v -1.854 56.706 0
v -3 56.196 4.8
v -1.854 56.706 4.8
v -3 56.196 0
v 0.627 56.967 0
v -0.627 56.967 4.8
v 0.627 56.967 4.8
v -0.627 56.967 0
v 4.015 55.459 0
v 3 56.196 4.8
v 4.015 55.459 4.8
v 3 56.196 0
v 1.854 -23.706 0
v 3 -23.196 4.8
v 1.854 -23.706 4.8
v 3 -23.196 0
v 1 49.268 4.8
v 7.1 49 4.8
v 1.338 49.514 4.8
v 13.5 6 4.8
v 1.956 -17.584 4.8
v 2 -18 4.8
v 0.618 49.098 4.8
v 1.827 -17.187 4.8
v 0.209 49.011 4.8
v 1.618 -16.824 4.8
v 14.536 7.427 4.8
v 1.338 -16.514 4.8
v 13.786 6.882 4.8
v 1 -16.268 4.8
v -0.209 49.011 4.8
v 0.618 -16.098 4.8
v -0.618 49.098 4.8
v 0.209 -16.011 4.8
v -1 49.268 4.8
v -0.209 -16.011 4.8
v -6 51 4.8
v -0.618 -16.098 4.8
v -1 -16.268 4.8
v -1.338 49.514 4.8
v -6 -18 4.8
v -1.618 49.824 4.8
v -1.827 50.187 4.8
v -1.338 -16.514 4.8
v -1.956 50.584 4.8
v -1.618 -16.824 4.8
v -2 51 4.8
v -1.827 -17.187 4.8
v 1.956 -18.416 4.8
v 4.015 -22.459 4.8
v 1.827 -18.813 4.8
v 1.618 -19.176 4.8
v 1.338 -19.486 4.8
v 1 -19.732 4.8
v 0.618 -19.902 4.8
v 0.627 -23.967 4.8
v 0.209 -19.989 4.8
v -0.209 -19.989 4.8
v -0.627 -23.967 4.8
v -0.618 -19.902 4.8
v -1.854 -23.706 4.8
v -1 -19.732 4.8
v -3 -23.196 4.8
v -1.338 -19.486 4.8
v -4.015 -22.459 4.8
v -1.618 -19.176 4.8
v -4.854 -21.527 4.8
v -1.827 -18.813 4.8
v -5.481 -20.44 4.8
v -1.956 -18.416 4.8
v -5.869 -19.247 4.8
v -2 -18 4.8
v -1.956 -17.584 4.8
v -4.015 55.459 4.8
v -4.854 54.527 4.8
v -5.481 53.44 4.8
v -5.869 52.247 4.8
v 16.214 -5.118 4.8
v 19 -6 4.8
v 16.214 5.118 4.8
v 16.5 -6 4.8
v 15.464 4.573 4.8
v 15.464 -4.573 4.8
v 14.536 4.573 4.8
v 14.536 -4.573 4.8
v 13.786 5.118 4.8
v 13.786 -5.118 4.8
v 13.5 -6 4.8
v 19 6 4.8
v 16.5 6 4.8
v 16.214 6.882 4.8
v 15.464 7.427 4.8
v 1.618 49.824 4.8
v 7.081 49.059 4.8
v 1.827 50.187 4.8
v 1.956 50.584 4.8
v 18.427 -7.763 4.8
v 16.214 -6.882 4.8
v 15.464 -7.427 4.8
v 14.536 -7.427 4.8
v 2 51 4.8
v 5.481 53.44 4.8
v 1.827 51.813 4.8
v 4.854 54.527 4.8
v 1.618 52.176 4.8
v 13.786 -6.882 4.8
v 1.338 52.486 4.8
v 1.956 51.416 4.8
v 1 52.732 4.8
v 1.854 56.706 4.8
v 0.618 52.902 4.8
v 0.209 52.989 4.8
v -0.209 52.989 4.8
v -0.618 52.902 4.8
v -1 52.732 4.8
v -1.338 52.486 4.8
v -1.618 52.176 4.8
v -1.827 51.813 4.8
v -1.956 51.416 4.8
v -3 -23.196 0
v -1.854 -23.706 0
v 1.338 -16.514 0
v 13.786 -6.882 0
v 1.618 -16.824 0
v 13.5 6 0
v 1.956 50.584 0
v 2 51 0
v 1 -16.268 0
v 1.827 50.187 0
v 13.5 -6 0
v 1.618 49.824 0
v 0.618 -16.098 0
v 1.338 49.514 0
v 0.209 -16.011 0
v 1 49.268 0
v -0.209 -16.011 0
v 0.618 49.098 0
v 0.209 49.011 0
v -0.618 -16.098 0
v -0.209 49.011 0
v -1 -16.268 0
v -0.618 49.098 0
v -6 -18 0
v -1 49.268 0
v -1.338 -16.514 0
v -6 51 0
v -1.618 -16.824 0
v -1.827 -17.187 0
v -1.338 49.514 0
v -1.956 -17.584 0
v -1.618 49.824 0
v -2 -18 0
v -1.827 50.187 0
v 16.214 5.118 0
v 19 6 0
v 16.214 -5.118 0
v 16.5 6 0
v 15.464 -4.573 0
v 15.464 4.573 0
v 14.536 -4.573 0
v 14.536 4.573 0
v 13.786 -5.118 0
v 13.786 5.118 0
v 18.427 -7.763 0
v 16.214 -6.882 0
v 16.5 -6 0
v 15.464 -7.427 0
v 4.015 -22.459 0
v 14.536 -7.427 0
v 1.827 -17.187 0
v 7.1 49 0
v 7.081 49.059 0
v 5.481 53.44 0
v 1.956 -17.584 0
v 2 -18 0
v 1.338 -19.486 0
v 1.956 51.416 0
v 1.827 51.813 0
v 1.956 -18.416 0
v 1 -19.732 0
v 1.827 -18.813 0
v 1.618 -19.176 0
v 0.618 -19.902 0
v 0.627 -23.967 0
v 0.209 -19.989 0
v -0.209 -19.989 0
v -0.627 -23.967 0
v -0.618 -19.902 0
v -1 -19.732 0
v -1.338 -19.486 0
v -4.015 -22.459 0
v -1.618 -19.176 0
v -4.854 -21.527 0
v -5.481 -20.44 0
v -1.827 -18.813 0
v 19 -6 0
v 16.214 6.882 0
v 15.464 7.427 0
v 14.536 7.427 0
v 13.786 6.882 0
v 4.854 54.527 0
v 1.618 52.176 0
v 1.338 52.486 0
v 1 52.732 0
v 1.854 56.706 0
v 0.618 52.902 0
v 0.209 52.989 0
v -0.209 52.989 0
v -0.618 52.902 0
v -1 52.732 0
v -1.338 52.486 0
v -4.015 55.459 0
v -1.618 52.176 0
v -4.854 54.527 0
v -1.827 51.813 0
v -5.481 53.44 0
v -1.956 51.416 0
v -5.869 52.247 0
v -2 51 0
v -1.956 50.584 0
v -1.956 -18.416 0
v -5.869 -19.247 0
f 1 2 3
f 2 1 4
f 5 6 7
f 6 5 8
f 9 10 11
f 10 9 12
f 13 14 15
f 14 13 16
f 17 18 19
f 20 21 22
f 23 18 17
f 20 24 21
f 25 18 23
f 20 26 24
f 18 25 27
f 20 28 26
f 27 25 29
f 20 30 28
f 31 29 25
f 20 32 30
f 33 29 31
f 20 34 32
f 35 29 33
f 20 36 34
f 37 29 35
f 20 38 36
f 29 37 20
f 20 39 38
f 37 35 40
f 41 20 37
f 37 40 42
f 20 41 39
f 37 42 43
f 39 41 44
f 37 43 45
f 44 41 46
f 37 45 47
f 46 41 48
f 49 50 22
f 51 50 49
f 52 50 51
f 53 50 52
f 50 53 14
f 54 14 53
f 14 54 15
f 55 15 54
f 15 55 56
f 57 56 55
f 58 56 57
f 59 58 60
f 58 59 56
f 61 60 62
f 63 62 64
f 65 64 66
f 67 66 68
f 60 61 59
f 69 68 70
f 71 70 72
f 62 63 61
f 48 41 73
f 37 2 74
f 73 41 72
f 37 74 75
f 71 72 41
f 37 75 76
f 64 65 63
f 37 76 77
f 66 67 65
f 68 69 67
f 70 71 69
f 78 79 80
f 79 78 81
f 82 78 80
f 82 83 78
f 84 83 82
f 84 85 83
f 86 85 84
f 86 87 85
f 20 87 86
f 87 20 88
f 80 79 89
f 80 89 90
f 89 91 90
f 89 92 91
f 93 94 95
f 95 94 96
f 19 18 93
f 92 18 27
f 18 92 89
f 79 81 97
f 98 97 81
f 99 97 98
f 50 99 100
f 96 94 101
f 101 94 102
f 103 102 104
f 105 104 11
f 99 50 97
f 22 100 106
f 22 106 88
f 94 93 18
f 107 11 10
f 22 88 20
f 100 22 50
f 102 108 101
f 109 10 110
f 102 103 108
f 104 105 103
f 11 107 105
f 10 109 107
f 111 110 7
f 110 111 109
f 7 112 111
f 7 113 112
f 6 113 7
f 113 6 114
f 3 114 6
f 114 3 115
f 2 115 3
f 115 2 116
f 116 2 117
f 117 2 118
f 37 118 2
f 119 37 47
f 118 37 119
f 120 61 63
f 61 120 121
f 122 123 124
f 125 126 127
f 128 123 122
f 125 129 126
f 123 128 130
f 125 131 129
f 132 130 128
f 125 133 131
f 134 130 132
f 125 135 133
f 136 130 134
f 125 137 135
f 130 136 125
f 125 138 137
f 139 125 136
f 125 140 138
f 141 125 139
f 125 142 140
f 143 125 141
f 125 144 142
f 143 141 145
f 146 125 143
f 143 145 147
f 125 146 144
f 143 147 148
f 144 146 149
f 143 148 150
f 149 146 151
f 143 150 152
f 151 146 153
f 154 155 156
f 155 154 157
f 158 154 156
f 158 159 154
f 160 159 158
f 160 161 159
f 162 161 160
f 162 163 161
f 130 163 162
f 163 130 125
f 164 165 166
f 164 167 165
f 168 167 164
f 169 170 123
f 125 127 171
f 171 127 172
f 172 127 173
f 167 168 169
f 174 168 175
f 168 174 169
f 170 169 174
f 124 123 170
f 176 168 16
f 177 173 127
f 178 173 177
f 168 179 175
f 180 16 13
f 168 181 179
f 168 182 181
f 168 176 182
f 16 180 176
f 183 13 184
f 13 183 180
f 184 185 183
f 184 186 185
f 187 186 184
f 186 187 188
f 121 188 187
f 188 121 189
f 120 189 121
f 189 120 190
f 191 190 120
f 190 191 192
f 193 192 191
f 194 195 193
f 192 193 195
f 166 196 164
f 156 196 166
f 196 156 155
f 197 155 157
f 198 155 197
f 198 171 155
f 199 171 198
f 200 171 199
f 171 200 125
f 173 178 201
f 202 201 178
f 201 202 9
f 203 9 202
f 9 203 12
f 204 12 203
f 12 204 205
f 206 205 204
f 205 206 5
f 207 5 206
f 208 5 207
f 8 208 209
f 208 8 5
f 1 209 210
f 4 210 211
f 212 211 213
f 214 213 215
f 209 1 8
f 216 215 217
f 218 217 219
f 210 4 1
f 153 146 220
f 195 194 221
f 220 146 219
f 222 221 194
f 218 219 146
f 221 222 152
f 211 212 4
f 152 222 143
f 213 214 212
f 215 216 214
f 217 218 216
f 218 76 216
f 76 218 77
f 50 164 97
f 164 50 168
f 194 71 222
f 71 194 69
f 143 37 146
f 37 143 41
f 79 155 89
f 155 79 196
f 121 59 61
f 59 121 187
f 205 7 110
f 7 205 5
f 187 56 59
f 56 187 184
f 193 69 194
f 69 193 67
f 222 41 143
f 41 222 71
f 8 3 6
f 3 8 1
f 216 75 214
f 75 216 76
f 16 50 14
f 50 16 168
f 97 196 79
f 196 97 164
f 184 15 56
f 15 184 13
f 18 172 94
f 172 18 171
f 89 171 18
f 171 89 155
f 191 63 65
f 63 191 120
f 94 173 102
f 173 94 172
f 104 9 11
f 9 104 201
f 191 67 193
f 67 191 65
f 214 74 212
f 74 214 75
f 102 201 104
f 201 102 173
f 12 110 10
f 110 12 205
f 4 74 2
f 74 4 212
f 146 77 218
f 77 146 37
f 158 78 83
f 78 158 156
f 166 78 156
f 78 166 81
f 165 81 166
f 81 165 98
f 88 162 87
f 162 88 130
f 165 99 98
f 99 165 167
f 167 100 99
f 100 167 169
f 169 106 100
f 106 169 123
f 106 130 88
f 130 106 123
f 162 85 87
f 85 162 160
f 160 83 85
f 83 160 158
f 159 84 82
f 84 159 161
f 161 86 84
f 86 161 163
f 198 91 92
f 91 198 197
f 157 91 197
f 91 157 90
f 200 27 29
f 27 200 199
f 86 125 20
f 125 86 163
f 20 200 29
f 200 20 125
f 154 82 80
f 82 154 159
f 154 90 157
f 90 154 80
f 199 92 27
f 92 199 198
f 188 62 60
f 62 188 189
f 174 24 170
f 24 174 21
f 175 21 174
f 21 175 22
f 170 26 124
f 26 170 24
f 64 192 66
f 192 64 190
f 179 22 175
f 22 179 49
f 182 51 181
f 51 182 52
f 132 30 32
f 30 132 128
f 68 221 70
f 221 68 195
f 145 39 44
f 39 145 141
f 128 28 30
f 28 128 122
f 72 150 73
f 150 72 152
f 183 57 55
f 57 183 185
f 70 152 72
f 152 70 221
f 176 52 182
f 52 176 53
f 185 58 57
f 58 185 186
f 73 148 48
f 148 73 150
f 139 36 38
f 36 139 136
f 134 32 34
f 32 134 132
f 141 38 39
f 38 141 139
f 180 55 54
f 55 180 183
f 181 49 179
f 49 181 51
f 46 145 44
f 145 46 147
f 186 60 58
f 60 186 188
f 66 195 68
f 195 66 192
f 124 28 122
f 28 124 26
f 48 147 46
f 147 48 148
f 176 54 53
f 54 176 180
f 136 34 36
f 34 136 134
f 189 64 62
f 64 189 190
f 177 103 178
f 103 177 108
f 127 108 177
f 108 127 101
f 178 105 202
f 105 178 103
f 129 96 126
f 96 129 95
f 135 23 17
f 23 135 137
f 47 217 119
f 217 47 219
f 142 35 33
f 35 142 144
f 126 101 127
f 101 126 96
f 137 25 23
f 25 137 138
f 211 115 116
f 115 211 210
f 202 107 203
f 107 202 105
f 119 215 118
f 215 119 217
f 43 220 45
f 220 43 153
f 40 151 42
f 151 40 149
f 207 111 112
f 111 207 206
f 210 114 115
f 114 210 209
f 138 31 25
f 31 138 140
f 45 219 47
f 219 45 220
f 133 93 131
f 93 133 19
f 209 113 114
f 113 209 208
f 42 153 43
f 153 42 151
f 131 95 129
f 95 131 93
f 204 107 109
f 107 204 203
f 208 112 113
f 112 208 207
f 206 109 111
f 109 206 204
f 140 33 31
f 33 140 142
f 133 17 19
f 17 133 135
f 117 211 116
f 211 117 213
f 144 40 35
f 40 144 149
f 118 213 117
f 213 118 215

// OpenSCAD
module pieza(){
	import("upper left screw arm.stl");
}

union(){
	
	mirror([0,0,0])difference(){
		hull(){
			translate([6.98,-19,0])cylinder(r=0.1,h=4.8,$fn=10);
			translate([7.,49,0])cylinder(r=0.1,h=4.8,$fn=10);
			translate([16,-6,0])cylinder(r=3,h=4.8,$fn=10);
			translate([16,6,0])cylinder(r=3,h=4.8,$fn=10);
			translate([0,-18,0])cylinder(r=6,h=4.8,$fn=30);
			translate([0,51,0])cylinder(r=6,h=4.8,$fn=30);
		}
		translate([15,-6,-0.5])cylinder(r=1.5,h=5.8,$fn=10);
		translate([15,6,-0.5])cylinder(r=1.5,h=5.8,$fn=10);
		translate([0,-18,-1])cylinder(r=2,h=7,$fn=30);
		translate([0,51,-1])cylinder(r=2,h=7,$fn=30);
	}		
}
